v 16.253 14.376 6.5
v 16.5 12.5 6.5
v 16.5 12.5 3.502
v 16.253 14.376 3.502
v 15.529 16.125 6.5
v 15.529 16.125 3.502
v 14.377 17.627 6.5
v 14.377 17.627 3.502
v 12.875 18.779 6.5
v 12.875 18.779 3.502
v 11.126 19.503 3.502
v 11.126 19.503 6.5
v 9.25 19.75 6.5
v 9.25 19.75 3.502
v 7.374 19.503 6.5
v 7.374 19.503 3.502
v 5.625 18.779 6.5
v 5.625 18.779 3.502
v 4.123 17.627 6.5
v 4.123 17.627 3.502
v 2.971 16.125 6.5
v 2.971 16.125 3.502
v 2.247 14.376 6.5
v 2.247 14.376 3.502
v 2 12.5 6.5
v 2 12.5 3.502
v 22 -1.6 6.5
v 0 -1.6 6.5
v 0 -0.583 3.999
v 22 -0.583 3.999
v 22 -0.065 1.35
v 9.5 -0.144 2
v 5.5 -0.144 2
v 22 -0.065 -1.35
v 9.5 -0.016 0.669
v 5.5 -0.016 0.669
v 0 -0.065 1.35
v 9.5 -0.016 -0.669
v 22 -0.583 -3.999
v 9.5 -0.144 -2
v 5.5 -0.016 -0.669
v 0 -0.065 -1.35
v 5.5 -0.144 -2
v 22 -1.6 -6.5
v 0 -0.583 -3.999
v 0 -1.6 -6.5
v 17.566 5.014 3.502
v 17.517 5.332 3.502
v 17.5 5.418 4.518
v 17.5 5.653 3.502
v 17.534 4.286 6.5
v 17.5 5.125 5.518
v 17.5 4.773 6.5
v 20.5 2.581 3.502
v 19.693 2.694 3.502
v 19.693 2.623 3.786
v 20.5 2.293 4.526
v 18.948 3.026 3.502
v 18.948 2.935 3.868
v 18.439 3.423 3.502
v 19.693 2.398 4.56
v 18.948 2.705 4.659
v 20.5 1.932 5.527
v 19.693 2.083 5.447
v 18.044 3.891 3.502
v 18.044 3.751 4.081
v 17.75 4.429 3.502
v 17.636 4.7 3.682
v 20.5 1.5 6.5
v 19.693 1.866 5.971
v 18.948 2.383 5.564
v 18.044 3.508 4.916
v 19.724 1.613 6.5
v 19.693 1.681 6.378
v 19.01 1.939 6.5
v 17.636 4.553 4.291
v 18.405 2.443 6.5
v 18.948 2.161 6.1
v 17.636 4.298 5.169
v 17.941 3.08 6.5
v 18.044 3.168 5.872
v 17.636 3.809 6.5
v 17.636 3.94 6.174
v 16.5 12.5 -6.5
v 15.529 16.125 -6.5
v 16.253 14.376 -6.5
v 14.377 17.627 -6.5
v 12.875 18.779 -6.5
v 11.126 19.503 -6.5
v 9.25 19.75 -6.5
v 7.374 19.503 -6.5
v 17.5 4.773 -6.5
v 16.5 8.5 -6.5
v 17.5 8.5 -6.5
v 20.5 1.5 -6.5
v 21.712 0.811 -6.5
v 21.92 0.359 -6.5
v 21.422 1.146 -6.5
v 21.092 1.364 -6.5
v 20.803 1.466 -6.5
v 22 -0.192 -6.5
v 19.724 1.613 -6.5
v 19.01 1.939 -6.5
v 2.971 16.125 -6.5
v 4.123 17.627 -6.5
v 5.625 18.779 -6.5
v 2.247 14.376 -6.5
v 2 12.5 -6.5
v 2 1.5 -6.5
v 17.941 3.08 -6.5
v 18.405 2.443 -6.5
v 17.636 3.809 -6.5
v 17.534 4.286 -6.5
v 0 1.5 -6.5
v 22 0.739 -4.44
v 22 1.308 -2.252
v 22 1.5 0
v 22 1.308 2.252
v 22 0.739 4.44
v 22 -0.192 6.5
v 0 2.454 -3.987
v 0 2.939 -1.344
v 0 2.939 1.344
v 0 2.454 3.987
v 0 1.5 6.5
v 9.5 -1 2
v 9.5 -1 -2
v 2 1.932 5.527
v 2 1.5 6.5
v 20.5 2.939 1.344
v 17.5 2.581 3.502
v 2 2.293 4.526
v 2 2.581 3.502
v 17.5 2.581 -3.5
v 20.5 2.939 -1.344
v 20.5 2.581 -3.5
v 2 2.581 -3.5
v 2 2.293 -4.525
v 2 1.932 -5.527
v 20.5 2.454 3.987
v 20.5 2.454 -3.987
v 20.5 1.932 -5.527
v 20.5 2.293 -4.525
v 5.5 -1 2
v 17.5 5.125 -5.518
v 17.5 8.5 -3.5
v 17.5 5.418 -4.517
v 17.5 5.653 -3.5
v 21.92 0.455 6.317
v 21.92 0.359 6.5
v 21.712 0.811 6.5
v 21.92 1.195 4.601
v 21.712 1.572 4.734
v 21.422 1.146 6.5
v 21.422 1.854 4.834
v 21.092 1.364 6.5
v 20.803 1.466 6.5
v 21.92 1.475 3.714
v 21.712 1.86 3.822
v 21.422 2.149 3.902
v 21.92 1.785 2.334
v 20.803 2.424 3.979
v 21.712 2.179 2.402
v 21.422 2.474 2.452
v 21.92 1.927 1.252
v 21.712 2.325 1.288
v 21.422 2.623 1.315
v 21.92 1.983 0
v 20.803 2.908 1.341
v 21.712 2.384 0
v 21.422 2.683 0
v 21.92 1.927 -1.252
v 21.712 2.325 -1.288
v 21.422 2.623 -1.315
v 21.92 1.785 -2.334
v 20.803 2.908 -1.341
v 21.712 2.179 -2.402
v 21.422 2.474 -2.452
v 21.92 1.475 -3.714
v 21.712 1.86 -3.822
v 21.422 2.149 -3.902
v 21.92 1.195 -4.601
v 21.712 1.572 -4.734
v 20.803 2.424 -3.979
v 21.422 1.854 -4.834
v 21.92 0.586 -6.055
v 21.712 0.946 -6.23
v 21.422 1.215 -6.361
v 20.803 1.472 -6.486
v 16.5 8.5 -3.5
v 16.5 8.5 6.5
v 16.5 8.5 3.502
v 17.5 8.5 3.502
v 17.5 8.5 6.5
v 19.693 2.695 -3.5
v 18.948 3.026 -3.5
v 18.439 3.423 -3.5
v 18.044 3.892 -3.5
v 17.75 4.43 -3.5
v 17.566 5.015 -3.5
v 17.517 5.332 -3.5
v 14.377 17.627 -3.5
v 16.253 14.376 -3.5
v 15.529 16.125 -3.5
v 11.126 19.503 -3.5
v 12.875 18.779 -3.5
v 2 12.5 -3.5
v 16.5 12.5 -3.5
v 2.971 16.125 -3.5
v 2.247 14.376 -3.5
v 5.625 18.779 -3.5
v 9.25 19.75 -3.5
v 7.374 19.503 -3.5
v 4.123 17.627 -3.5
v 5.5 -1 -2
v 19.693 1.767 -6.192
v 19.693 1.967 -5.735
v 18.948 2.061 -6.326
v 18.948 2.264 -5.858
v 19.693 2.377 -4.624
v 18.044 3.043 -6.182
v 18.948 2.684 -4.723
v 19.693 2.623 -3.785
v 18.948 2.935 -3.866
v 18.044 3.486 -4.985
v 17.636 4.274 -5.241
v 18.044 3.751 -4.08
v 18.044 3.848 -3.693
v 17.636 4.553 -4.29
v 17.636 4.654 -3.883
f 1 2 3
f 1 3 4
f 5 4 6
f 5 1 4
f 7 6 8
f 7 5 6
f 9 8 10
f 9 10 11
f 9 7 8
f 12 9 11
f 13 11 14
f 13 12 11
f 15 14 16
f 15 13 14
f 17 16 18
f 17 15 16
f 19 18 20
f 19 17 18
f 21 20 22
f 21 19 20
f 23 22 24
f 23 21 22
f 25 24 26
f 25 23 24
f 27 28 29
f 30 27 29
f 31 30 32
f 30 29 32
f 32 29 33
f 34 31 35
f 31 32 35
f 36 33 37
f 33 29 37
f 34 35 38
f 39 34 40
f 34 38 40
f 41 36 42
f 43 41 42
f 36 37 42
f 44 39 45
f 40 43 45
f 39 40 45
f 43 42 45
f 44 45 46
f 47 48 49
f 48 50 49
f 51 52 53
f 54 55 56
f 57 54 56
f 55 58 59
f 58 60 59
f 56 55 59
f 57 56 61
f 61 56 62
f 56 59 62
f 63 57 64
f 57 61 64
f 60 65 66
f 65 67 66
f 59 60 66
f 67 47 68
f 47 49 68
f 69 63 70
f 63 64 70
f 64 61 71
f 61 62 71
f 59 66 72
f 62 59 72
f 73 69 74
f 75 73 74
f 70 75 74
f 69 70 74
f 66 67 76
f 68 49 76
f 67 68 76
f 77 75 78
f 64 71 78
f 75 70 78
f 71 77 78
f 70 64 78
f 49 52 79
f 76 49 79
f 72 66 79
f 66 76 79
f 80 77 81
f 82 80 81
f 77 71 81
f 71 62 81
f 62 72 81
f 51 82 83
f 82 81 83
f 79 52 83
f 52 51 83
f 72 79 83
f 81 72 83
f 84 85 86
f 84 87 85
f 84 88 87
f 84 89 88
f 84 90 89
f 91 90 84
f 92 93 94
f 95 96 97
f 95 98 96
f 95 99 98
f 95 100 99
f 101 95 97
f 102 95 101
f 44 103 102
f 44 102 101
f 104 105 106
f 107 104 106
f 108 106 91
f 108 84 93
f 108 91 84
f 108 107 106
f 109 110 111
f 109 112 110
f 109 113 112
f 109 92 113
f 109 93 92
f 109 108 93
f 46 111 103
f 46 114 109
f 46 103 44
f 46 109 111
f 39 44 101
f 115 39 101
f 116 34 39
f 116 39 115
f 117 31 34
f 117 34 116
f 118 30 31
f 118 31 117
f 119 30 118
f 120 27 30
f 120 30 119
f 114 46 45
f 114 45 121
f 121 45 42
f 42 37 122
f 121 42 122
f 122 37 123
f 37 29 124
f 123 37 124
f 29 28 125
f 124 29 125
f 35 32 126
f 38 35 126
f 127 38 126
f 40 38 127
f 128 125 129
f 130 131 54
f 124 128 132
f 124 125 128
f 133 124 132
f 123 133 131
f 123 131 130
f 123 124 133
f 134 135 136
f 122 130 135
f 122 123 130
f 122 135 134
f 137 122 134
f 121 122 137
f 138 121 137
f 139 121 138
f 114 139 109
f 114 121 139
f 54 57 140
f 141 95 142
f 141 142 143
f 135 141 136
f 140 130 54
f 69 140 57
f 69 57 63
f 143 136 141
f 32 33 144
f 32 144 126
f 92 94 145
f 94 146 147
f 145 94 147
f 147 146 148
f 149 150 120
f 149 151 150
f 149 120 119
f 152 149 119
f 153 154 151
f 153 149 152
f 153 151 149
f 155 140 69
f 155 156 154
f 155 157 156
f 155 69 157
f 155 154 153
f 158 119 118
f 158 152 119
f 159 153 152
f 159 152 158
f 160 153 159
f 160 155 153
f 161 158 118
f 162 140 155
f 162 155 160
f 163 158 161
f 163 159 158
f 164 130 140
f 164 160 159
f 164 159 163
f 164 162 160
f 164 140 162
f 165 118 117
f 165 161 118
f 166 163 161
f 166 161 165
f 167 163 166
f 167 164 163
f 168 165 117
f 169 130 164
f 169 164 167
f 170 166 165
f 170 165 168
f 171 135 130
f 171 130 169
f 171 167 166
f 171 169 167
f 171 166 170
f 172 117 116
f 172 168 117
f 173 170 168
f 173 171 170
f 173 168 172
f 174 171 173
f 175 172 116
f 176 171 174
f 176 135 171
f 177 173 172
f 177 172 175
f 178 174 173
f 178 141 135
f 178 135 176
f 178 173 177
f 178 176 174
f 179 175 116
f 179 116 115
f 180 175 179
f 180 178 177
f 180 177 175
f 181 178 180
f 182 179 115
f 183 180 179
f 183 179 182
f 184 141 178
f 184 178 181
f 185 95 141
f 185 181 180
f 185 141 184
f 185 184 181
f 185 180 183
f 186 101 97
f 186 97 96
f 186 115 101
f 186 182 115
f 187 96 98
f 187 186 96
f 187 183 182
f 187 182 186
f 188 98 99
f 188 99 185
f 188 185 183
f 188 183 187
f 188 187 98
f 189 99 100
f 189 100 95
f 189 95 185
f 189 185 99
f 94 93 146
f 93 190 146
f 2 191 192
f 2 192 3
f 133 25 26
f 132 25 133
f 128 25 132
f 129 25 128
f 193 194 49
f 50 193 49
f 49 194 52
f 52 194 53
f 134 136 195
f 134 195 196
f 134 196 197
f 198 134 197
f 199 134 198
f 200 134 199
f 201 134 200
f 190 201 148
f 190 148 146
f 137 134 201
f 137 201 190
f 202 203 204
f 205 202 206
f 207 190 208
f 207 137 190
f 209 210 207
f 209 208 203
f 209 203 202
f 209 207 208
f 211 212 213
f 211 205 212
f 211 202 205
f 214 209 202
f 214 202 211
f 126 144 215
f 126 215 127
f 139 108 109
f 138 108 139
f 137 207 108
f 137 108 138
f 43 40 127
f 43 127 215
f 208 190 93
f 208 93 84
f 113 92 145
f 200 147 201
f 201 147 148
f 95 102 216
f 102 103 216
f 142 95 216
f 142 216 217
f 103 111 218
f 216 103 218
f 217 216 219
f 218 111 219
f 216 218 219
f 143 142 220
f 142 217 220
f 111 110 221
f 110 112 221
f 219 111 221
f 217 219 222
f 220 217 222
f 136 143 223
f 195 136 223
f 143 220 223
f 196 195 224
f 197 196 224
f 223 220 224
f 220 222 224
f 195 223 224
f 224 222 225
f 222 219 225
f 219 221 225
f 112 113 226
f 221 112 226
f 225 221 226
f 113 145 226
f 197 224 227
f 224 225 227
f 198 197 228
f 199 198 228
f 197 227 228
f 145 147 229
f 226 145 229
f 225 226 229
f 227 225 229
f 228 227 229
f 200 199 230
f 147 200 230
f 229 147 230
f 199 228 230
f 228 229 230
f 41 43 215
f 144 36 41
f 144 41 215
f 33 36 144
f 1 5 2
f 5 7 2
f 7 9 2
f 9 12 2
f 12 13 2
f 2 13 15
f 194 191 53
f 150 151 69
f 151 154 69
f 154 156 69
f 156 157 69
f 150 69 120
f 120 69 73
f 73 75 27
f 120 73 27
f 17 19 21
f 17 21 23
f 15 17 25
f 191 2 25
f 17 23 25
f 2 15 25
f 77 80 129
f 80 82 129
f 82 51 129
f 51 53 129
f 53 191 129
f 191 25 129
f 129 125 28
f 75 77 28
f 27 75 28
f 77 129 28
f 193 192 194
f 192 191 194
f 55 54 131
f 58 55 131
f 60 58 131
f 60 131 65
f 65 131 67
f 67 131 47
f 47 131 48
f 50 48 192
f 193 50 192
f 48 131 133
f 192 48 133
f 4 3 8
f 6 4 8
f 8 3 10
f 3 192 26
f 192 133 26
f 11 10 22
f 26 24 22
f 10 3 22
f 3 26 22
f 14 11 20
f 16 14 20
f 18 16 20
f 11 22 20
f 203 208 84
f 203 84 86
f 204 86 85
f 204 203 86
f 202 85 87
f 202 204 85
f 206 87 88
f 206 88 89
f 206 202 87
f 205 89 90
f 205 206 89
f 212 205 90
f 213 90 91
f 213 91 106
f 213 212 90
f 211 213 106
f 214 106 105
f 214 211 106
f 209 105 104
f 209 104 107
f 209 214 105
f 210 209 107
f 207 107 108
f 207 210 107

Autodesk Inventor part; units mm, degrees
ref_plane "YZ Plane" through (0, 0, 0) normal (1, 0, 0) x (0, 1, 0)
ref_plane "XZ Plane" through (0, 0, 0) normal (0, 1, 0) x (-1, 0, 0)
ref_plane "XY Plane" through (0, 0, 0) normal (0, 0, 1) x (1, 0, 0)
sketch "Sketch1" plane through (0, 0, 0) normal (1, 0, 0) x (0, 1, 0)
  line L0 (1.5, 6.5) -> (-1.5, 6.5) construction
  line L1 (-1.5, 6.5) -> (-1.6004, 6.5) construction
  line L2 (1.5, -6.5) -> (-1.5, -6.5) construction
  line L3 (-1.5, -6.5) -> (-1.6004, -6.5) construction
  arc A0 (-1.6004, -6.5) -> (-1.6004, 6.5) centre (-14, 0) ccw
  arc A1 (1.5, -6.5) -> (1.5, 6.5) centre (-11.8333, 0) ccw
  arc A2 (1.5, -6.5) -> (1.5, 6.5) centre (-11.8333, 0) ccw
  line L4 (1.5, -6.5) -> (-1.6004, -6.5)
  line L5 (1.5, 6.5) -> (-1.6004, 6.5)
  point P0 (0, 0)
  point P1 (0, 0)
extrude "Extrusion1" add sketch "Sketch1" along normal blind 22
sketch "Sketch2" plane through (0, -1.6004, 6.5) normal (0, 0, 1) x (1, 0, 0)
  line L0 (2, 3.1004) -> (0, 3.1004)
  line L1 (2, 14.1004) -> (2, 3.1004)
  line L2 (2, 3.1004) -> (2, 14.1004)
  line L3 (16.5, 10.1004) -> (16.5, 14.1004)
  line L4 (16.5, 14.1004) -> (16.5, 10.1004)
  line L5 (16.5, 10.1004) -> (17.5, 10.1004)
  line L6 (16.5, 10.1004) -> (17.5, 10.1004)
  line L7 (17.5, 3.1004) -> (22, 3.1004)
  line L8 (17.5, 10.1004) -> (17.5, 3.1004)
  arc A0 (16.5, 14.1004) -> (2, 14.1004) centre (9.25, 14.1004) ccw
  line L9 (0, 1.6004) -> (0, 0) projected
  line L10 (0, 0) -> (0, 14.7425)
  line L11 (0, 3.1004) -> (0, 4.6004) construction
  line L12 (0, 3.1004) -> (-6.4438, 3.1004) construction
  line L13 (0, 3.1004) -> (6.4438, 3.1004) construction
  line L14 (2, 3.1004) -> (17.5, 3.1004)
  dimension "d2" = 180
extrude "Extrusion2" add sketch "Sketch2" against normal up to surface (13 mm away)
sketch "Sketch3" plane through (2, 1.5, 6.5) normal (-1, 0, 0) x (0, 0, 1)
  line L0 (0, 0) -> (0, -3)
  line L1 (-13, 11) -> (-13, 18.25)
  line L2 (0, 0) -> (-13, 0)
  line L3 (-13, 0) -> (-13, 18.25)
  line L4 (-13, 18.25) -> (0, 18.25)
  line L5 (0, 18.25) -> (0, 0)
  arc A0 (0, 0) -> (-13, 0) centre (-6.5, -13.3333) ccw
  arc A1 (0, 0) -> (-13, 0) centre (-6.5, -13.3333) ccw
  line L6 (-10, 1.0812) -> (-10, 7)
  line L7 (-10, 1.0812) -> (-10, 18.25)
  line L8 (-2.9979, 11) -> (-2.9979, 18.25)
  line L9 (-2.9979, 1.0807) -> (-2.9979, 18.25)
  point P0 (-6.5, -1.5)
  point P1 (-2.9979, 1.0807)
extrude "Extrusion3" cut sketch "Sketch3" against normal blind 22 contours L4 L8 L9 A0 L6 L7
fillet "Fillet1" radius 1.5 1 edges at (22, 3, 0)
fillet "Fillet2" radius 3 2 edges at (17.5, 2.1211, 5.0302) (17.5, 2.1214, -5.0291)
sketch "Sketch4" plane through (0, 0, 0) normal (0, 1, 0) x (-1, 0, 0)
  line L0 (0, 0) -> (-7.5, 0)
  line L1 (-5.5, -2) -> (-9.5, -2)
  line L2 (-9.5, -2) -> (-9.5, 2)
  line L3 (-9.5, 2) -> (-5.5, 2)
  line L4 (-5.5, 2) -> (-5.5, -2)
  dimension "d9" = 7.5
  dimension "d10" = 4
  dimension "d11" = 4
extrude "Extrusion4" add sketch "Sketch4" along normal blind 0.5 and the other way blind 1
sketch "Sketch5" plane through (0, -1, 0) normal (0, -1, 0) x (1, 0, 0)
  line L0 (9.5, 2) -> (9.5, -2) projected
  line L1 (5.5, -2) -> (5.5, 2) projected
  line L2 (9.5, -2) -> (5.5, -2)
  line L3 (5.5, -2) -> (5.5, 2)
  line L4 (5.5, 2) -> (9.5, 2)
  line L5 (9.5, 2) -> (9.5, -2)
  point P0 (0, 0)
extrude "Extrusion5" add sketch "Sketch5" along normal up to surface (0.6004 mm away)
sketch "Sketch6" plane through (5.5, -1.6004, -2) normal (0, -1, 0) x (1, 0, 0)
  line L0 (0, 4) -> (4, 4) projected
  line L1 (0, 0) -> (4, 0)
  line L2 (4, 0) -> (4, 4)
  line L3 (4, 4) -> (0, 4)
  line L4 (0, 4) -> (0, 0)
  point P0 (-5.5, 2)
extrude "Extrusion6" cut sketch "Sketch6" against normal blind 0.6
properties part number "Clip"
